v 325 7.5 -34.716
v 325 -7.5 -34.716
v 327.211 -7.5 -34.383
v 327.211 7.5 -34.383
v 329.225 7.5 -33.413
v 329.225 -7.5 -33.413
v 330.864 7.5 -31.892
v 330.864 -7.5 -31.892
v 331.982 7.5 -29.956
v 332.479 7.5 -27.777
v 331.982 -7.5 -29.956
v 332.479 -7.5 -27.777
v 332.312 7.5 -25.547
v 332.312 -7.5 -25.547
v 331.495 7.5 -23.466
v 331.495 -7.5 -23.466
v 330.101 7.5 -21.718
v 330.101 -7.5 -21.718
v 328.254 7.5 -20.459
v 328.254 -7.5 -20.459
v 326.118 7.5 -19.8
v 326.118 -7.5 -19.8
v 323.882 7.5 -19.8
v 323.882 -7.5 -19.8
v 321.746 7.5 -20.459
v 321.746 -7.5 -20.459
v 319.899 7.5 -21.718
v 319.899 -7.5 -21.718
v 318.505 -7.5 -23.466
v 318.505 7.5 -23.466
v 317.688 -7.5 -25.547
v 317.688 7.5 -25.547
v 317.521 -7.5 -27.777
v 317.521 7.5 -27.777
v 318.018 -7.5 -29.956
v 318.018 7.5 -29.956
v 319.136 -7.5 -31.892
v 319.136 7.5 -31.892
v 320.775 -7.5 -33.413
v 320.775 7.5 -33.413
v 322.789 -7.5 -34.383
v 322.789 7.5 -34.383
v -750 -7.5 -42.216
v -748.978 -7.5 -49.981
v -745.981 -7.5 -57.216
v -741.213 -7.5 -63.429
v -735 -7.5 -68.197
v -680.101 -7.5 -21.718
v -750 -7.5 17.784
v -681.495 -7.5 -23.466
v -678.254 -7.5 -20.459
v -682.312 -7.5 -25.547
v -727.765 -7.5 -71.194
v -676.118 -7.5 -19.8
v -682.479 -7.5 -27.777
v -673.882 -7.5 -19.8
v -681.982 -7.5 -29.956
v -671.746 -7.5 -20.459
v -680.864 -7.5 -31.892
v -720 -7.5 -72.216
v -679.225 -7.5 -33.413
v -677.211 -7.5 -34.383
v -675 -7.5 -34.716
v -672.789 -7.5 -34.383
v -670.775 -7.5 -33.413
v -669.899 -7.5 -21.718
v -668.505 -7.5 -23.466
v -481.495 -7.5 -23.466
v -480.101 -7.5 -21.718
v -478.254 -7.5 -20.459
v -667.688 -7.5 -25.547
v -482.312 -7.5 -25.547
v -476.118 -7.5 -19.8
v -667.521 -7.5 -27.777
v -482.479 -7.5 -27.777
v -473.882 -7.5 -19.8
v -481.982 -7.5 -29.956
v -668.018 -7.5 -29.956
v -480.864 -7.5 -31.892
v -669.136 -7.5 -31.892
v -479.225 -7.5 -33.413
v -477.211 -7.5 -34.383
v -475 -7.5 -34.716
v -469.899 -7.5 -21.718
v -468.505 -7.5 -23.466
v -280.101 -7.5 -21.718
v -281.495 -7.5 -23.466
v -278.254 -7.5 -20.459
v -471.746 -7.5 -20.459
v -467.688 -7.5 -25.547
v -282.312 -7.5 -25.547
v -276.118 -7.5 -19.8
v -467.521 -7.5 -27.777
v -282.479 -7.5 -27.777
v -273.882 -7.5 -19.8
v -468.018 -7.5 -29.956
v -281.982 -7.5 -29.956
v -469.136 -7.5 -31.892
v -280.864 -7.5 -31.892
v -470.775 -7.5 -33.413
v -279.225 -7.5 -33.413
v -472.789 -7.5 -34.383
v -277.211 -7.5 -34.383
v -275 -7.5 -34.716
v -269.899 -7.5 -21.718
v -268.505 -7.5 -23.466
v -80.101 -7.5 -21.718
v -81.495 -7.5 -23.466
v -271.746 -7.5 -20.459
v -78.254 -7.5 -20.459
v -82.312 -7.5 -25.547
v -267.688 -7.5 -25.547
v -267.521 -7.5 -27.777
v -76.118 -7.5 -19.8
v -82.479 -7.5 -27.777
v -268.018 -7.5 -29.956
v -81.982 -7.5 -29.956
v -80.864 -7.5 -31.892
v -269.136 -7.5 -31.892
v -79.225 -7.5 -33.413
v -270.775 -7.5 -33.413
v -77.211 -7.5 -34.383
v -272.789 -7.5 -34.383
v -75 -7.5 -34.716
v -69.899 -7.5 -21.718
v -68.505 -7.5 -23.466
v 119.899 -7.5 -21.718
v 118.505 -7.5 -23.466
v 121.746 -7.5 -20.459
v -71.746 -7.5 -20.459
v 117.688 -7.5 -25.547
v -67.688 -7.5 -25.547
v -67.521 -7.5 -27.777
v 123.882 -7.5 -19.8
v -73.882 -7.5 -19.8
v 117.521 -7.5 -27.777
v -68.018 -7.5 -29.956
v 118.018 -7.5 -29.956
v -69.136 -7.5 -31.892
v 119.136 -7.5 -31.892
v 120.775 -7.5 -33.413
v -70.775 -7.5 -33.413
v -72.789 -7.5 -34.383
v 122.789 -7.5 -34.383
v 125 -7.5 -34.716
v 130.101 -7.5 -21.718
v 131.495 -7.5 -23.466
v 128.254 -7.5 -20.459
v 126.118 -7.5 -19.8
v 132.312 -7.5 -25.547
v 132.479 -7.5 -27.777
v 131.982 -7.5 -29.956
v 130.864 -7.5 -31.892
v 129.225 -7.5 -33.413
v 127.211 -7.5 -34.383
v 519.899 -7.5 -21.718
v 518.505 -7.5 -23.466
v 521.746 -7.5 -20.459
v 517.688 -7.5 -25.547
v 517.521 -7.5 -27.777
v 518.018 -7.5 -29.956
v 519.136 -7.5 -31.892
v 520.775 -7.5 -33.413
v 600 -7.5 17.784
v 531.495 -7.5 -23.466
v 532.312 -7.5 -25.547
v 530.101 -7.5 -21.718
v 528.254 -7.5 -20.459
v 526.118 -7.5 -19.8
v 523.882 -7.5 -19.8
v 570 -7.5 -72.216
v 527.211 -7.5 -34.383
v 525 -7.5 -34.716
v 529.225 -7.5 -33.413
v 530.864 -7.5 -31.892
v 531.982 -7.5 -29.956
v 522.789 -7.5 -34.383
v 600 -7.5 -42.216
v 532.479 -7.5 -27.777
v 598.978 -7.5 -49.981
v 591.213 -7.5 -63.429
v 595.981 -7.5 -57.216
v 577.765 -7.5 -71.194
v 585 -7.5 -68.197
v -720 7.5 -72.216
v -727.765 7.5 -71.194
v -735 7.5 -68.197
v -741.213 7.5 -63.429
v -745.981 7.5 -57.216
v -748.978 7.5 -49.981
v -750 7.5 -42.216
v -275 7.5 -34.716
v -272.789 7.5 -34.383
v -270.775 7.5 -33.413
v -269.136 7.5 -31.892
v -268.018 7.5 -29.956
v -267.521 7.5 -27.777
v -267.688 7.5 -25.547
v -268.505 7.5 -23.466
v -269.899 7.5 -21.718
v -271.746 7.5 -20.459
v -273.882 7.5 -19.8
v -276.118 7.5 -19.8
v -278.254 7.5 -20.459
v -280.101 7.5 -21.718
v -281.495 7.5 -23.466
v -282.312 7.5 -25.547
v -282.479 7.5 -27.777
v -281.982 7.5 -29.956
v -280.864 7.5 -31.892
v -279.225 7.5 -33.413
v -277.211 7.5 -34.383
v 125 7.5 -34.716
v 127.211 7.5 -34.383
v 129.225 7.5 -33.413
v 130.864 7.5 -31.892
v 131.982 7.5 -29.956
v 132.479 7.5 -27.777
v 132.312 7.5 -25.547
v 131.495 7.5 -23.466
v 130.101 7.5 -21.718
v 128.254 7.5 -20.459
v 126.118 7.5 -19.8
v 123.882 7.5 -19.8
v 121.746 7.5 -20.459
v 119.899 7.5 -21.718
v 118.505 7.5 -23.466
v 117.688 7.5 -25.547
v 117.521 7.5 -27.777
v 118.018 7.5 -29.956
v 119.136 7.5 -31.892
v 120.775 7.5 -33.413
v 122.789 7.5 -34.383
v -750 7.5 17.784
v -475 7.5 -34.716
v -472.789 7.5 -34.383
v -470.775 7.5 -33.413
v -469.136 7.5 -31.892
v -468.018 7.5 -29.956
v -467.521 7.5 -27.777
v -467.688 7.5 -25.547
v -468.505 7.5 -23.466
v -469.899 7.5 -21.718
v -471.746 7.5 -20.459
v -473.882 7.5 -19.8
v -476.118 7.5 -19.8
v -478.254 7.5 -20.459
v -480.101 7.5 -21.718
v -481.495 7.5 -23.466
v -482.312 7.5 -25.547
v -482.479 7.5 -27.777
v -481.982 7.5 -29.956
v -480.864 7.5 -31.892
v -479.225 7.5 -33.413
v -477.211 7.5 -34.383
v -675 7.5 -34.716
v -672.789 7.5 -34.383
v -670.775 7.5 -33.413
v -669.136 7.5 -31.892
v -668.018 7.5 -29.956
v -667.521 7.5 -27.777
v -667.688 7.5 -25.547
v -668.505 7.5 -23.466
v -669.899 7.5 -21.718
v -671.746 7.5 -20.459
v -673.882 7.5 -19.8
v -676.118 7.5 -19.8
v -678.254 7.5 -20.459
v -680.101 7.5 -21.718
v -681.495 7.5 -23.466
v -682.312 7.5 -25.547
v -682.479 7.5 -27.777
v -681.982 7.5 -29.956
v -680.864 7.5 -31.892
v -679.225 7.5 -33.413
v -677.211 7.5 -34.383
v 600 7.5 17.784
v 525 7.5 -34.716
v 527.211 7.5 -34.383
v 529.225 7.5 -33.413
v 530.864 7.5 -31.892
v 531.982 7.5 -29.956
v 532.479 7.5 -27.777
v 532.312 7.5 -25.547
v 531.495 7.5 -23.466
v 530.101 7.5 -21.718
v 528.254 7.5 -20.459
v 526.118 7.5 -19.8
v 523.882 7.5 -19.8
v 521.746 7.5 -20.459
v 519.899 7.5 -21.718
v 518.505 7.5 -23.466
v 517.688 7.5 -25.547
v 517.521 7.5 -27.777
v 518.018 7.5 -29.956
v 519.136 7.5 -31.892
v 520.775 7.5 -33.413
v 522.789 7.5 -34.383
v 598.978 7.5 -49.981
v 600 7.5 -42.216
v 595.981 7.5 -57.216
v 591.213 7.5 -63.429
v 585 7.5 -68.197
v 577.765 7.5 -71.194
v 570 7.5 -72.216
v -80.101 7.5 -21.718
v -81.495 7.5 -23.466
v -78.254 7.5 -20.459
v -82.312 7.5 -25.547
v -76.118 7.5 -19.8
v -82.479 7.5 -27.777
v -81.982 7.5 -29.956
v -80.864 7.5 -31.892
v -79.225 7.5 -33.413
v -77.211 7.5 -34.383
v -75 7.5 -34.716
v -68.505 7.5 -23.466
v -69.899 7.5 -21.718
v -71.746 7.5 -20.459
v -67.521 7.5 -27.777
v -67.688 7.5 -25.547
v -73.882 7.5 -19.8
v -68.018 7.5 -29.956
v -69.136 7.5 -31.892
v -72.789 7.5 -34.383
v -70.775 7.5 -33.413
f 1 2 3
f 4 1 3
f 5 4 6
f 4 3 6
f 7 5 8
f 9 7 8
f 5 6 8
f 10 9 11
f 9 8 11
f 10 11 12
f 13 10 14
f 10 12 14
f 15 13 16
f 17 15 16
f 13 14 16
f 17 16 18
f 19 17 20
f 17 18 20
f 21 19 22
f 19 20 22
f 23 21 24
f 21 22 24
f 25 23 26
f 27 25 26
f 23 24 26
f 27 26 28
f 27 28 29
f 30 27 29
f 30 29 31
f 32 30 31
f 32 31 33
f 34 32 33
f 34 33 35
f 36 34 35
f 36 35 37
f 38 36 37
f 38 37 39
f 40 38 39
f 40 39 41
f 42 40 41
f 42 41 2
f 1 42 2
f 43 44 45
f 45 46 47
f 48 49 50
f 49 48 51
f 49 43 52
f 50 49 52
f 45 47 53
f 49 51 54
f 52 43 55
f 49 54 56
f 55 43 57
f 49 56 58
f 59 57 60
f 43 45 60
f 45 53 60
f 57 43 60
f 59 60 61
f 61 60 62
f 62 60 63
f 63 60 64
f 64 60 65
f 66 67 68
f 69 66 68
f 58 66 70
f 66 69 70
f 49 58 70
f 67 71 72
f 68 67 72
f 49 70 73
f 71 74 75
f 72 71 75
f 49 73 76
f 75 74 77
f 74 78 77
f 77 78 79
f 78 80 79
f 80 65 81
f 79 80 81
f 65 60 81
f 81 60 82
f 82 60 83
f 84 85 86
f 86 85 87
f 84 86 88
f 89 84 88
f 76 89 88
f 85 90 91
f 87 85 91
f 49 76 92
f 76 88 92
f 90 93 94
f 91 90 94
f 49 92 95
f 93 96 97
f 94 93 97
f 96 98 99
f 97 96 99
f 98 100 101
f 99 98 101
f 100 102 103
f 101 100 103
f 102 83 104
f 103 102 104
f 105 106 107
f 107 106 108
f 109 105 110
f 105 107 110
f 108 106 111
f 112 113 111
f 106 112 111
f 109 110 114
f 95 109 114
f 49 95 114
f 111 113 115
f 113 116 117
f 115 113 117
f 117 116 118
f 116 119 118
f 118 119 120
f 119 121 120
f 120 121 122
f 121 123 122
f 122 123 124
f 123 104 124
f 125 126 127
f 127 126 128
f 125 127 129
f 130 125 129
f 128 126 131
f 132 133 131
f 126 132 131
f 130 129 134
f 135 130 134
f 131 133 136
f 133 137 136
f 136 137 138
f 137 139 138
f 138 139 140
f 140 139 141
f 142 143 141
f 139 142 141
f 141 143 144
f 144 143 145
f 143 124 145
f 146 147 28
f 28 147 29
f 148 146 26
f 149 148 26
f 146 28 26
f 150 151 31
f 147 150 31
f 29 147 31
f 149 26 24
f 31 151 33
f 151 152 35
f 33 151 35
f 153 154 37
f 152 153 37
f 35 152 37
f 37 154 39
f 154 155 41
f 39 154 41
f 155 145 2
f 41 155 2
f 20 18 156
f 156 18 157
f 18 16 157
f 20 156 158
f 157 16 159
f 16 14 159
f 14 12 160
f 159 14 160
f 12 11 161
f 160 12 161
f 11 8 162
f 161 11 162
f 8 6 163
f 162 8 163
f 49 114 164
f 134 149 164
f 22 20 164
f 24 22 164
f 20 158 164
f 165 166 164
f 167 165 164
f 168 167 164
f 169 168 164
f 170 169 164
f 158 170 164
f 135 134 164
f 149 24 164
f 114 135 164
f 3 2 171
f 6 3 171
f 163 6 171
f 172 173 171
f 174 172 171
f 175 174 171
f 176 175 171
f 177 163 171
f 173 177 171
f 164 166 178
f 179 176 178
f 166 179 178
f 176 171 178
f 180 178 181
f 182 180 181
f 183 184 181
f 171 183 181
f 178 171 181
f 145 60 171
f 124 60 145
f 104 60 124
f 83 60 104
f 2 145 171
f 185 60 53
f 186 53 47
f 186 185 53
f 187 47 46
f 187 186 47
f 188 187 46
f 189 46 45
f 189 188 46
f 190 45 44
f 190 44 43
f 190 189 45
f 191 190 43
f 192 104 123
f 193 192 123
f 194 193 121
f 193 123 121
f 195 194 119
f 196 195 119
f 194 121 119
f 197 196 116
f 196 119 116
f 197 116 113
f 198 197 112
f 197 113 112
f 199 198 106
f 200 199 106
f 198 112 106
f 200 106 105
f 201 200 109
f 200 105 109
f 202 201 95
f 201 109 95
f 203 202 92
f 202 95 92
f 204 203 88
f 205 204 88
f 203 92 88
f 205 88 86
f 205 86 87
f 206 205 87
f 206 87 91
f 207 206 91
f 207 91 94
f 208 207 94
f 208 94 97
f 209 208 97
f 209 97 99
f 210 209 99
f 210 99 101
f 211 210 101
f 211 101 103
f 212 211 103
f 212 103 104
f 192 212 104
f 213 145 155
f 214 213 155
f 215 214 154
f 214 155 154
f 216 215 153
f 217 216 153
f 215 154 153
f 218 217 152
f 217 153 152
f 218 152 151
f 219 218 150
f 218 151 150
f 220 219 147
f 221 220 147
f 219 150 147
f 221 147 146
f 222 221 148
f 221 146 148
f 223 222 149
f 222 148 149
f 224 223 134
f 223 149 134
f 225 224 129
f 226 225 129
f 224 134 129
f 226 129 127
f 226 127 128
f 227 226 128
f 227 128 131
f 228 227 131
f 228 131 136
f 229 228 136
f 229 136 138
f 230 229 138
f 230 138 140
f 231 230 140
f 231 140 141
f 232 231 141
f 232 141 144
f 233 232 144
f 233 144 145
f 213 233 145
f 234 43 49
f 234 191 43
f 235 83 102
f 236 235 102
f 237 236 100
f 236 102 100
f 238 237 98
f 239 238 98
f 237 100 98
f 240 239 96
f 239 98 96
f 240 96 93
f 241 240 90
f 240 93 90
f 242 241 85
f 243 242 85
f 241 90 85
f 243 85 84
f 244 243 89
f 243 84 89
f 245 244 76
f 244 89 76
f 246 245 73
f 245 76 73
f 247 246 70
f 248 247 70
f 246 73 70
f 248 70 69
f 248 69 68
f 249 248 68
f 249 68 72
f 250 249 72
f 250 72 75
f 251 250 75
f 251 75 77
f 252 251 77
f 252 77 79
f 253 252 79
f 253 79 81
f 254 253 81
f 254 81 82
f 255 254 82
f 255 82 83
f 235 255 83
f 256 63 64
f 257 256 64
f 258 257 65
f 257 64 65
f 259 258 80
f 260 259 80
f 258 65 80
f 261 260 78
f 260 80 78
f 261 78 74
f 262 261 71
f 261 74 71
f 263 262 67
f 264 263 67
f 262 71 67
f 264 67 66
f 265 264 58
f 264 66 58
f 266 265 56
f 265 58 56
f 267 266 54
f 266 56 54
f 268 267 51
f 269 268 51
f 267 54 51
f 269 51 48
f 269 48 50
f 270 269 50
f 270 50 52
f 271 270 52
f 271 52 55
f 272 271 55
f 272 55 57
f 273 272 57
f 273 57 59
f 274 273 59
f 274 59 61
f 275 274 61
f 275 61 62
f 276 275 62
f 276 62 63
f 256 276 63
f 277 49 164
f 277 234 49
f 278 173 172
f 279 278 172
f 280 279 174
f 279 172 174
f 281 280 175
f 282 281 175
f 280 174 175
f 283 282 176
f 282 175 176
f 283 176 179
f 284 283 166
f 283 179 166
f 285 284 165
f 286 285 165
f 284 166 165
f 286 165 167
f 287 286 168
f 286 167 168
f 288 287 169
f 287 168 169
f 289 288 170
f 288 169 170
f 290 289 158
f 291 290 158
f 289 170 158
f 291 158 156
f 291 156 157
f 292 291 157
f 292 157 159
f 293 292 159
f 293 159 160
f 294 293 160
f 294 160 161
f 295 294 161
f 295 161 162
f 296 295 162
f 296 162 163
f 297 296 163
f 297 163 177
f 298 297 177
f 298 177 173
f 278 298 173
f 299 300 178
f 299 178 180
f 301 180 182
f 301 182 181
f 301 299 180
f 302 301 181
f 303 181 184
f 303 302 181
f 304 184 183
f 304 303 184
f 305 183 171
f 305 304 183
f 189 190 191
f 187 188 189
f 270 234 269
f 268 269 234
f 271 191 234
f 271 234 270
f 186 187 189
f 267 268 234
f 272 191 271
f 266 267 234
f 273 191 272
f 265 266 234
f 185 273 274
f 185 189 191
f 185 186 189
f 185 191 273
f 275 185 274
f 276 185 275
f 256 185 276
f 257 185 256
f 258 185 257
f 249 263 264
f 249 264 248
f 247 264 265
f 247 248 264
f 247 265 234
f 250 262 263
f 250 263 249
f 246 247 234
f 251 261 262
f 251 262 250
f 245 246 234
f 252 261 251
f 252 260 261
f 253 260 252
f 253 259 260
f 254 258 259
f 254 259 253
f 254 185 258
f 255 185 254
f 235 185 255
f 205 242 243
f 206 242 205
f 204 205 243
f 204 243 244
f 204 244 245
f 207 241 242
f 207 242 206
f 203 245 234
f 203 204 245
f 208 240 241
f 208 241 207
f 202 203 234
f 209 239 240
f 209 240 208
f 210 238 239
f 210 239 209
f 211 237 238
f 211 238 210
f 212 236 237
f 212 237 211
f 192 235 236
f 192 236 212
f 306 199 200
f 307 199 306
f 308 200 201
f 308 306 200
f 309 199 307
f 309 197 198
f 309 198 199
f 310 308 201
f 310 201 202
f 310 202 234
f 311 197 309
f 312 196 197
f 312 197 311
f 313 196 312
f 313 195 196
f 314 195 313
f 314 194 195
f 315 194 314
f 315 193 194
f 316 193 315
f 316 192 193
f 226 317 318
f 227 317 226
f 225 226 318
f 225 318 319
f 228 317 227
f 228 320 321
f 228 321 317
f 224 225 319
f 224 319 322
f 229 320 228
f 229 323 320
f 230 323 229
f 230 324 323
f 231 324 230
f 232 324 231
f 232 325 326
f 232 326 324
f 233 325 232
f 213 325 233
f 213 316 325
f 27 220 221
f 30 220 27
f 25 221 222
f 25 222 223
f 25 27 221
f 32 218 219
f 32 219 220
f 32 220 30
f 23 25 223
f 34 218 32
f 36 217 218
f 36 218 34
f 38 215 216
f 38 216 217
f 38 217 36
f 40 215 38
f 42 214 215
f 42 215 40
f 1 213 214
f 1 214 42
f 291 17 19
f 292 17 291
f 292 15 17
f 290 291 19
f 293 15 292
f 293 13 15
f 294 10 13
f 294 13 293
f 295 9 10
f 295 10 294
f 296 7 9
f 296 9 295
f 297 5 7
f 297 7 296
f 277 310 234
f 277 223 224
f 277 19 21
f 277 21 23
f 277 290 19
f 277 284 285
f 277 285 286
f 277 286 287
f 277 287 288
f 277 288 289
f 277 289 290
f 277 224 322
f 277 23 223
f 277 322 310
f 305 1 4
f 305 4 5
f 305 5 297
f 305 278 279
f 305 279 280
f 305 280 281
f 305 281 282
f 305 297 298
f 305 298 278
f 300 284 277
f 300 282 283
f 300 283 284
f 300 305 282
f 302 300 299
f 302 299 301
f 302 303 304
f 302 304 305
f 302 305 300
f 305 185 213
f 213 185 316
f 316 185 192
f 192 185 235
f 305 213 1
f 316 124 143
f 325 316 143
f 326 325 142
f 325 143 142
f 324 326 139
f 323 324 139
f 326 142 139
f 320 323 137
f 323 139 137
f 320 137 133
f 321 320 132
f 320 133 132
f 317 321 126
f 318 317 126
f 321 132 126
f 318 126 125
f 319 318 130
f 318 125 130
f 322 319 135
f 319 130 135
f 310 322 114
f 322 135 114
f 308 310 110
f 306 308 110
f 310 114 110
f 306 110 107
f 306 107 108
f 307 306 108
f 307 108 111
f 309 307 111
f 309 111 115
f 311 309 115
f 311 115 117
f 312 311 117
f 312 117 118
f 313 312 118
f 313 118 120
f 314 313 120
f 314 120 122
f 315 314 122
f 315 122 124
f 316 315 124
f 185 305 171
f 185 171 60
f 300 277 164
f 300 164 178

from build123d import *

# Parameters (mm, degrees)
BOSS_EXTRUDE1_DEPTH = 7.5
SKETCH2_R           = 7.5
CUT_EXTRUDE1_DEPTH  = 754.618053682


with BuildPart() as part:
    # Sketch1 → Boss-Extrude1 (new, symmetric)
    with BuildSketch(Plane(origin=(0, 0, 0), x_dir=(1, 0, 0), z_dir=(0, 1, 0))):
        with BuildLine():
            Line((-750, -17.783860282), (600, -17.783860282))
            Line((600, -17.783860282), (600, 42.216139718))
            ThreePointArc((600, 42.216139718), (591.213203436, 63.429343154), (570, 72.216139718))
            Line((570, 72.216139718), (-720, 72.216139718))
            ThreePointArc((-720, 72.216139718), (-741.213203436, 63.429343154), (-750, 42.216139718))
            Line((-750, 42.216139718), (-750, -17.783860282))
        make_face()
    extrude(amount=BOSS_EXTRUDE1_DEPTH, both=True)

    # Sketch2 → Cut-Extrude1 (cut, through all)
    with BuildSketch(Plane.XZ.offset(7.5)):
        with Locations(Location((-675, -27.216139718, 0), (0, 0, 270))):
            Circle(SKETCH2_R)
        with Locations(Location((-475, -27.216139718, 0), (0, 0, 270))):
            Circle(SKETCH2_R)
        with Locations(Location((-275, -27.216139718, 0), (0, 0, 270))):
            Circle(SKETCH2_R)
        with Locations(Location((-75, -27.216139718, 0), (0, 0, 270))):
            Circle(SKETCH2_R)
        with Locations(Location((125, -27.216139718, 0), (0, 0, 270))):
            Circle(SKETCH2_R)
        with Locations(Location((325, -27.216139718, 0), (0, 0, 270))):
            Circle(SKETCH2_R)
        with Locations(Location((525, -27.216139718, 0), (0, 0, 270))):
            Circle(SKETCH2_R)
    extrude(amount=-CUT_EXTRUDE1_DEPTH, mode=Mode.SUBTRACT)


solid = part.part
